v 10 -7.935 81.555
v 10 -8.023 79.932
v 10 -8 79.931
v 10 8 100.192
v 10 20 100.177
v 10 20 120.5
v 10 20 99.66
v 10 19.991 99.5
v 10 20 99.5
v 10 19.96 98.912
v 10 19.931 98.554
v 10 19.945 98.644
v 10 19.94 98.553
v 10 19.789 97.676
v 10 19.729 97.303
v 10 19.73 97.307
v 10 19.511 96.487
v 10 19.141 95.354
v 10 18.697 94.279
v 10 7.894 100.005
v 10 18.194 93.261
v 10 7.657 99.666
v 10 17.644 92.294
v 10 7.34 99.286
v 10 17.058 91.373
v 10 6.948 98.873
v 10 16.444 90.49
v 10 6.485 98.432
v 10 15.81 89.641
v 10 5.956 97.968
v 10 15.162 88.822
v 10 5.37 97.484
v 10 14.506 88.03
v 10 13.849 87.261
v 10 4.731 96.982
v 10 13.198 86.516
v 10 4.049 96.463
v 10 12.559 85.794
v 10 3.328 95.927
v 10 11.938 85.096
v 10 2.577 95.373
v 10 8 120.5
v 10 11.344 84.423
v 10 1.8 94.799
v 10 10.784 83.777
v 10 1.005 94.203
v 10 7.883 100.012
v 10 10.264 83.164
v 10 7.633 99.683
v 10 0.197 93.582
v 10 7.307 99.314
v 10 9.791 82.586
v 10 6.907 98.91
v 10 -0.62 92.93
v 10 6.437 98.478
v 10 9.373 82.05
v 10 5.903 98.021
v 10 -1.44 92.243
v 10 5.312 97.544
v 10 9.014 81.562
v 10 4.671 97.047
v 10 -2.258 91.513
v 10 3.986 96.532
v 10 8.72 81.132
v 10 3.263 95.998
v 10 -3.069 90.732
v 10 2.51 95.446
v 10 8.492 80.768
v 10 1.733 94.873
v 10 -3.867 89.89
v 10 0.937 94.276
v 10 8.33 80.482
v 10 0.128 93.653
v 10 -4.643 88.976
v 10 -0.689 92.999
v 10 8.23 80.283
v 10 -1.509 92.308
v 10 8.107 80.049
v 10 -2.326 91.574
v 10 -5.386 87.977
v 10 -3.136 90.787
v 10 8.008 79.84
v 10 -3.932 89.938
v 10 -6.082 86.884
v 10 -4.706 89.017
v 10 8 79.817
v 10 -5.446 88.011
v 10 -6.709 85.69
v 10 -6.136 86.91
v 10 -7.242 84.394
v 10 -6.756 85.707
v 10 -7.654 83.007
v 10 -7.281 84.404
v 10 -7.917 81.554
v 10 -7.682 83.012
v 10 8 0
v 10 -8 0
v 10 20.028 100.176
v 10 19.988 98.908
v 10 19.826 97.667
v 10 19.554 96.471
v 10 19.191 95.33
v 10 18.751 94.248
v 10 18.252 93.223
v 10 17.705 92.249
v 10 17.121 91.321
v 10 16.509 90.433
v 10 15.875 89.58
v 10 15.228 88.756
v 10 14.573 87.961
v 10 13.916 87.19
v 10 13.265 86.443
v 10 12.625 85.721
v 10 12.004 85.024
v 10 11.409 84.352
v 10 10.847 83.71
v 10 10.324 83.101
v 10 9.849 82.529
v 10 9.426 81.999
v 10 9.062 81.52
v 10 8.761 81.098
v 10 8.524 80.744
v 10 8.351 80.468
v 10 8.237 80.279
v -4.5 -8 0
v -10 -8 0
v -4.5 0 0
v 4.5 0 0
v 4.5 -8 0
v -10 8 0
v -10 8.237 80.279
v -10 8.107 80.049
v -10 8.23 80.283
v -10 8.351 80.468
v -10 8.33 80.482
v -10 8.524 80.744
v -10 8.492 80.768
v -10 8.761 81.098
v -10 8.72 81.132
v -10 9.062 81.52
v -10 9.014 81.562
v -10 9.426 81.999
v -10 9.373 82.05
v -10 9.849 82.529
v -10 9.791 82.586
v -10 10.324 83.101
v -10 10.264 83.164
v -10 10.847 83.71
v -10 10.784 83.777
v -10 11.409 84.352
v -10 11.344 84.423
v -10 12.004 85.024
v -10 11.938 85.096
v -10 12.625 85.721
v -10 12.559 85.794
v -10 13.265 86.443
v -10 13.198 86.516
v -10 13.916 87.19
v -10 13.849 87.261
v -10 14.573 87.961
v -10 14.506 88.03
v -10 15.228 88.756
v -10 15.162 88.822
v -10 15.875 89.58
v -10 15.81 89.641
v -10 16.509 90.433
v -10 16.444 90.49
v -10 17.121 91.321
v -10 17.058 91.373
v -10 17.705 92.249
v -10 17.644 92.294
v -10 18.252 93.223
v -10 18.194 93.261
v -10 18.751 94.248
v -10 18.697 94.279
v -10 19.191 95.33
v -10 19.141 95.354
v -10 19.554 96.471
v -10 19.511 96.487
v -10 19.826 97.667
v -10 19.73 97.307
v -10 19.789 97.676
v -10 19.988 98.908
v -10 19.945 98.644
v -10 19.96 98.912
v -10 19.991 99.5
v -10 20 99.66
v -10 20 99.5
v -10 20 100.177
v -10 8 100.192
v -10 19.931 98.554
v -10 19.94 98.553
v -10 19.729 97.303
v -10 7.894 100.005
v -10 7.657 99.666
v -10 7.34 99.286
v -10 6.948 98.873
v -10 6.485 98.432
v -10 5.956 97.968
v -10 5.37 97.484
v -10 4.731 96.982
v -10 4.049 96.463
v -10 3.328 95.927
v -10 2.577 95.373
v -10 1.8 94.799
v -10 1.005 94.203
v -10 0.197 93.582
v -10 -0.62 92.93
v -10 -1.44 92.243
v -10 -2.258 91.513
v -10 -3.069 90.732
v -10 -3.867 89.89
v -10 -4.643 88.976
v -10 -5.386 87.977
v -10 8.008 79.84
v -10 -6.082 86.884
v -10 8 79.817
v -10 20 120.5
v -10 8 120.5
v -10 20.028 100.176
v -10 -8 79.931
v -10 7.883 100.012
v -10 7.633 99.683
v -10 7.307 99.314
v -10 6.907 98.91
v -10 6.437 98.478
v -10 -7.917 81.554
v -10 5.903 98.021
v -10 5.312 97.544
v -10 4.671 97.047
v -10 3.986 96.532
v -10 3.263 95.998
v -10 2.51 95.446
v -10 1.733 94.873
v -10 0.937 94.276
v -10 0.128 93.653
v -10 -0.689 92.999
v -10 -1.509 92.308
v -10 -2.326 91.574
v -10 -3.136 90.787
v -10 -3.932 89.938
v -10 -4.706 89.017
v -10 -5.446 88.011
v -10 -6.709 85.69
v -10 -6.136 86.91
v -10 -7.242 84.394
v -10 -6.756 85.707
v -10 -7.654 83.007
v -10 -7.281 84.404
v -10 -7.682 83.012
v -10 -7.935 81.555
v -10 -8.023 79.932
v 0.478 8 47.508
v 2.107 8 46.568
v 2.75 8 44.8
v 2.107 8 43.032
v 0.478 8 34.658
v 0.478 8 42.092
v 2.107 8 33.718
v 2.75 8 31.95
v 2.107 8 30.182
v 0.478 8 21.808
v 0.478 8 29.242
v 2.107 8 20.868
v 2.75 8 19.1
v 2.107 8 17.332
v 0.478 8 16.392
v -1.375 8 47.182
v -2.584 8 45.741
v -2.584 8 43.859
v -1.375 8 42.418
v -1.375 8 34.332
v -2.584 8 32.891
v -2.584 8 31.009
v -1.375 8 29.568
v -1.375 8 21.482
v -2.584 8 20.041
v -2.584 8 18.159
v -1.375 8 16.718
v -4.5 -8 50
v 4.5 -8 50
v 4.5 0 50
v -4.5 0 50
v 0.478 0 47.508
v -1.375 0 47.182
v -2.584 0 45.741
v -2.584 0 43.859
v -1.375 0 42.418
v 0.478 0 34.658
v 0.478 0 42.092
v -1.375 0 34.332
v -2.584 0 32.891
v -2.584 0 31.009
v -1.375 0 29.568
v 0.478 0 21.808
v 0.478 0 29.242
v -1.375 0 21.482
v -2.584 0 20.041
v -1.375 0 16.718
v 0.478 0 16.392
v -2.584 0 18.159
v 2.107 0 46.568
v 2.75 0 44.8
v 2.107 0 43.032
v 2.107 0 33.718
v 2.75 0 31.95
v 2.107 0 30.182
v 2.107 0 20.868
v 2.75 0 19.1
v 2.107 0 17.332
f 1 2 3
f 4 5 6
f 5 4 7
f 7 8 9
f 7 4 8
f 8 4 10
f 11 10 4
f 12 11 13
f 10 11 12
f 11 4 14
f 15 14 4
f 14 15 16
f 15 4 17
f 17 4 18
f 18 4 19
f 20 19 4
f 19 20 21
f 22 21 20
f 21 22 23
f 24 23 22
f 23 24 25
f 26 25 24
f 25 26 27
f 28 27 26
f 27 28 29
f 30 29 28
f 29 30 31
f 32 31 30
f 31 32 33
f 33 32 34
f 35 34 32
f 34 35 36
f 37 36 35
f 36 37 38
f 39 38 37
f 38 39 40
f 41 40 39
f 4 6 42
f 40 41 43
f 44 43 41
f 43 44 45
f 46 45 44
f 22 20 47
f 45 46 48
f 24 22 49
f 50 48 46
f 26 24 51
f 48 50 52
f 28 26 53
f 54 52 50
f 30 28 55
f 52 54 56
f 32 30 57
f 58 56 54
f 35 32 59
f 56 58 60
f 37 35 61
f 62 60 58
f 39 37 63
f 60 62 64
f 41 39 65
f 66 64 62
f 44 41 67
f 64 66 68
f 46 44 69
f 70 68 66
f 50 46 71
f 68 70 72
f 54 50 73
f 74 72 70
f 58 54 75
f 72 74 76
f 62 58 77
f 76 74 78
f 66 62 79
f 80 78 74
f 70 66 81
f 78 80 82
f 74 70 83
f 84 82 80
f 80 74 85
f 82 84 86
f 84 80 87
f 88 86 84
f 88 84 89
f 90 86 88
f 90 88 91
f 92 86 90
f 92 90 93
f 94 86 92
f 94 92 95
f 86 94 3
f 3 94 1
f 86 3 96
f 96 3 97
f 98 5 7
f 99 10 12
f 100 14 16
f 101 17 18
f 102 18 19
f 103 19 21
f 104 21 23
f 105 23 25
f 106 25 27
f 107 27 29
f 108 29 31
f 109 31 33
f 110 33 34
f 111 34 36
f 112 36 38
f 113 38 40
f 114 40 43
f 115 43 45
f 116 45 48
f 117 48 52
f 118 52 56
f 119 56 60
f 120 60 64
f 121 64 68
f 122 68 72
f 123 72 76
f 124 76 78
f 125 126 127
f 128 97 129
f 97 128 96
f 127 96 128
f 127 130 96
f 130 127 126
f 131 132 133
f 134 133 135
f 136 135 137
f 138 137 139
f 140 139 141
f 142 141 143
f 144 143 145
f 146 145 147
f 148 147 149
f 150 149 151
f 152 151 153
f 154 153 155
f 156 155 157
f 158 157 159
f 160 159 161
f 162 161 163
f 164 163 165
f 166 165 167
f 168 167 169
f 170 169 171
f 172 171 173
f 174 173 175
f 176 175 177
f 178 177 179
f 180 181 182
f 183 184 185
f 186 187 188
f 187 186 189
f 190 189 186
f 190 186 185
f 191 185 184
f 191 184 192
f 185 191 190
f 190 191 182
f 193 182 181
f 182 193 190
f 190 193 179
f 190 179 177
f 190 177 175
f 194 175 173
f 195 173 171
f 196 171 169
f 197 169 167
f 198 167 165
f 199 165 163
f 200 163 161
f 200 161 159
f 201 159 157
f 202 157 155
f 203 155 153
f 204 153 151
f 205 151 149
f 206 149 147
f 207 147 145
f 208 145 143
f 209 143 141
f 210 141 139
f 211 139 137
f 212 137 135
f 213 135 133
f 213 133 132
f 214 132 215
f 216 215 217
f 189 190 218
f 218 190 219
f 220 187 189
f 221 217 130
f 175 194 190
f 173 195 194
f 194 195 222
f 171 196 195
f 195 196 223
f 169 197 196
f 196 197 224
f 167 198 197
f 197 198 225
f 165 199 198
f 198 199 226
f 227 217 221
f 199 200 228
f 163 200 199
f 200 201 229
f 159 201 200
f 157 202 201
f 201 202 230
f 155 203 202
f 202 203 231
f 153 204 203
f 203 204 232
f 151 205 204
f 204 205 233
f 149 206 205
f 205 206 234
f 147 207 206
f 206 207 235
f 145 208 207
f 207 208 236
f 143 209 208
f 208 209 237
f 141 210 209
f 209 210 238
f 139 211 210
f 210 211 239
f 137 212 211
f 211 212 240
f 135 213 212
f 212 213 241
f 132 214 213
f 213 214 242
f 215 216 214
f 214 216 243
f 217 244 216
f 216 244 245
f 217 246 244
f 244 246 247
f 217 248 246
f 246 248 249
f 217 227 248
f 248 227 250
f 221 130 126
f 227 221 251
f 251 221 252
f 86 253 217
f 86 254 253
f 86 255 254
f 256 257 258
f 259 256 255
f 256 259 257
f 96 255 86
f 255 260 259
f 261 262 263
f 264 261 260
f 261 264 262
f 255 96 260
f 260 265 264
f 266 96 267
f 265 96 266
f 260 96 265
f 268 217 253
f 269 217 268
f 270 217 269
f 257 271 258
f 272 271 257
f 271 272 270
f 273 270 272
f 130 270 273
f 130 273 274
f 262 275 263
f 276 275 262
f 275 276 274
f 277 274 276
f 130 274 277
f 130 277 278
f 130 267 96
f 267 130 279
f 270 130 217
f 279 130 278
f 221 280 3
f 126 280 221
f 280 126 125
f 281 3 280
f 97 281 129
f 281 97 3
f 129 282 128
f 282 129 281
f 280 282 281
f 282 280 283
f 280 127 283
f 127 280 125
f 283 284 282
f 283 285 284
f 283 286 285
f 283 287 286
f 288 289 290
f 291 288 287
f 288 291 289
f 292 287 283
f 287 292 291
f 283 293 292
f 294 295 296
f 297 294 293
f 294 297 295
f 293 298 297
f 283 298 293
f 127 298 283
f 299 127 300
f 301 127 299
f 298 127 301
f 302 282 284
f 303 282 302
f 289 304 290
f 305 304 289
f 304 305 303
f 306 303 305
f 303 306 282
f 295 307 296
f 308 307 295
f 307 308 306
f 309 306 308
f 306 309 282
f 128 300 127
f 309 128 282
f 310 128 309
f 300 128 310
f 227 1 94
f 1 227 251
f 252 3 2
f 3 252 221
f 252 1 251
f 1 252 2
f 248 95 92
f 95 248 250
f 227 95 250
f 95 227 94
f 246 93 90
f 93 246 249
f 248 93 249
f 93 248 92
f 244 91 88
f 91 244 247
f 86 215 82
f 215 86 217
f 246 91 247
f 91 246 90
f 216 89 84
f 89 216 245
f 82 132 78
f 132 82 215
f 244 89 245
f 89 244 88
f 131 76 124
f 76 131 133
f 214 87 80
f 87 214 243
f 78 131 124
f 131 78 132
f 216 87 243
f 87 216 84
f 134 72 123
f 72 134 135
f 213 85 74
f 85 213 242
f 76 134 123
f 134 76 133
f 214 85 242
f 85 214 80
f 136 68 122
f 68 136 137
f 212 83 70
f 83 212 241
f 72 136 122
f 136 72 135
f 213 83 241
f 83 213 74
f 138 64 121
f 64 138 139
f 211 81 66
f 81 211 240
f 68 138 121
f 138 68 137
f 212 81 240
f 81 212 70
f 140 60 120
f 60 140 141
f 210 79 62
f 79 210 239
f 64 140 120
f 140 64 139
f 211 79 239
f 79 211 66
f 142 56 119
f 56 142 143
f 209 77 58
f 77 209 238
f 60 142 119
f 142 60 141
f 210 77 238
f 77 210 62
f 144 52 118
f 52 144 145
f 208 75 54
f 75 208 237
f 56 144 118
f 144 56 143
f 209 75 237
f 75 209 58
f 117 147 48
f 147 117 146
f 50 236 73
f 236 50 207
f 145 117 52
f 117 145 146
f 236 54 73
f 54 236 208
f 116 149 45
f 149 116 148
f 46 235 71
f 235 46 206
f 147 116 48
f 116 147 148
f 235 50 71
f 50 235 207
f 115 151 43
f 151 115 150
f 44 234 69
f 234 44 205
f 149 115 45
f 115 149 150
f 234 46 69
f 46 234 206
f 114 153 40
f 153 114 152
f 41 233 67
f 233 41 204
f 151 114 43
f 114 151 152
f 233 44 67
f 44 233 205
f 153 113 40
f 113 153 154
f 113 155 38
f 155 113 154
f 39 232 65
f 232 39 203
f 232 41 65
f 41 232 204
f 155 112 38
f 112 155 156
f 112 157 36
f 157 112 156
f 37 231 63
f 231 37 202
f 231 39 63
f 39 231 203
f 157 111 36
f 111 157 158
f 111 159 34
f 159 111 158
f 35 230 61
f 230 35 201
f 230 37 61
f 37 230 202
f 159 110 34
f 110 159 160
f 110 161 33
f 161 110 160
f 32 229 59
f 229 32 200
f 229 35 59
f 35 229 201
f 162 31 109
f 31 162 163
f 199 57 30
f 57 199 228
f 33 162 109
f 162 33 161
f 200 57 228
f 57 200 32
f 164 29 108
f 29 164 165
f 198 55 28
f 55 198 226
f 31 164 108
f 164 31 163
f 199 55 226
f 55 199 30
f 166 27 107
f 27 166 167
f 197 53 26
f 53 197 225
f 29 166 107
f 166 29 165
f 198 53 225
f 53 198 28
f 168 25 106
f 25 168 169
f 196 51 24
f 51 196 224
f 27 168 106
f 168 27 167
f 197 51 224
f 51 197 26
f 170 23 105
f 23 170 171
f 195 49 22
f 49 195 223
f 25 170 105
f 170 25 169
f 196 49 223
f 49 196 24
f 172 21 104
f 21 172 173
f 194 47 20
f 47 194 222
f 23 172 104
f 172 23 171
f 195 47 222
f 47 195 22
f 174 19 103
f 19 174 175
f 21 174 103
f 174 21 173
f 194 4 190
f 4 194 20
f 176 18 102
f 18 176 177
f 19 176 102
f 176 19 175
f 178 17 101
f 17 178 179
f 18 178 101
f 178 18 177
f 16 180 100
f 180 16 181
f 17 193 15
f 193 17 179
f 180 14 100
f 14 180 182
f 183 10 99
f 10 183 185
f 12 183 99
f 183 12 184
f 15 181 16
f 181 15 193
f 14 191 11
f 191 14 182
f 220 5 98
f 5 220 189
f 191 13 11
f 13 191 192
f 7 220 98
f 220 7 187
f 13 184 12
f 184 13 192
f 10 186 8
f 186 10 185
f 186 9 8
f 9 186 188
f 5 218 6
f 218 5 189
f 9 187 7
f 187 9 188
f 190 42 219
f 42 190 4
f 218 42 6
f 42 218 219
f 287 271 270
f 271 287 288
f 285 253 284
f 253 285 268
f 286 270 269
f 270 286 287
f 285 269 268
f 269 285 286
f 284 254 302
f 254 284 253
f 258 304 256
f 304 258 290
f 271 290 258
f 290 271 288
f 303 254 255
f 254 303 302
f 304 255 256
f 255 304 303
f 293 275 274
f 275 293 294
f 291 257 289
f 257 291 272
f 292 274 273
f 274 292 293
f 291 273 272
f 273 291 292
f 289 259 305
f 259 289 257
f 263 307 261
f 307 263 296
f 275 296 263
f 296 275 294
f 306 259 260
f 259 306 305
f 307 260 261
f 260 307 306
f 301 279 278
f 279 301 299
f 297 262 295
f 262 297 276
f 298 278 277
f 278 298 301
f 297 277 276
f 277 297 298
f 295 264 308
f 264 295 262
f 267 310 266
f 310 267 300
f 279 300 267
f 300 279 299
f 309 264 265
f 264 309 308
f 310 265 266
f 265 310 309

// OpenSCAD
// 车前固定接口 (Z轴稳定器 / 大行P8猪鼻转换底座抱箍)
// 坐标系: X=底座宽方向(正视图水平), Y=厚度方向(正视图纵深, M5孔沿此方向贯穿),
//          Z=竖直向上(底座高度方向)。整体在 X、Y 向居中。
// 底座: 20(宽) x 16(厚) x 80(高), 中央开竖槽(槽顶 z=BASE_H-SLOT_FROM_TOP), 底面开口竖直上插,
//       把抱箍螺丝座板(≈8宽 x 8厚)包入槽内增加稳定性。
// 延长臂: 截面独立(ARM_W x ARM_T), 从底座顶向"猪鼻环一侧"(+Y)平滑 S 形弯上, 末端竖直向上。
// M5孔距有二义性(12.5/25 或 13.2/26.4), 孔1 做成竖向短槽留旷量, 孔2/孔3 为竖向长槽。

// ========== 可调参数 ==========
BASE_W   = 20;      // 底座宽 (X), 正视图水平
BASE_T   = 16;      // 底座厚 (Y)
BASE_H   = 80;      // 底座高 (Z)

SLOT_W   = 9;       // 竖槽宽 (X)  —— 抱箍板宽 8, 留 1 旷量防 PETG 收缩
SLOT_D   = 8;       // 竖槽深 (Y)  —— 前侧挖去 8, 留 8 厚背壁
SLOT_FROM_TOP = 30; // 槽顶距底座顶距离
SLOT_TOP = BASE_H - SLOT_FROM_TOP;           // 槽顶 z(=50), 高于此处实体, 底面开口

HOLE_D   = 5.5;     // M5 间隙孔直径
HOLE1_TOP_GAP = 2.45; // 孔1 上弧边距槽顶的实测距离 (有测量误差)
HOLE1_EXT = 0.6;    // 孔1 竖槽两端额外余量(mm), 覆盖 2.45 的测量误差
HOLE_GAP13 = 25;    // 孔1 - 孔3 名义间距(mm)
HOLE_GAP12 = 13.2;  // 孔1 - 孔2 名义间距(mm)
HOLE_ALT13 = 26.4;  // 孔1 - 孔3 备选间距(若三孔等分)
HOLE_ALT12 = 12.5;  // 孔1 - 孔2 备选间距(若三孔等分)
SLOT_EXT   = 0.6;   // 孔槽两端额外余量(mm)

// 延长臂
ARM_W      = 20;     // 臂宽 (X) —— 独立设置
ARM_T      = 12;     // 臂厚 (Y) —— 独立设置
ARM_OFFSET = 14;    // 臂向猪鼻侧(+Y)的水平偏移
ARM_BEND   = 20;    // 弯段高度(mm): 底座顶 → 竖直段起点 的平滑过渡
ARM_VERT   = 20;    // 臂端竖直直臂长度(mm)
ARM_DIR    = +1;    // +1 = 向 +Y(远离螺丝座=猪鼻环侧); -1 = 反向
FC         = 64;    // 扫描细分段数(越大越平滑)

// 臂顶 z(总高)= 底座高 + 弯段高 + 竖直段长
ARM_TOP    = BASE_H + ARM_BEND + ARM_VERT;
RH = HOLE_D/2;      // M5 间隙孔半径

// ========== 底座(居中于 x=0, y=0; 0..BASE_H) ==========
// 竖槽: z∈[0, SLOT_TOP] 底面开口; X 居中宽 SLOT_W; 前侧(-Y)挖 SLOT_D, 留背部 SLOT_D 厚壁。
module base() {
    difference() {
        translate([0, 0, BASE_H/2]) cube([BASE_W, BASE_T, BASE_H], center=true);
        // 槽体: 从底面(z=0)开口向上到 SLOT_TOP; 贴前侧 -Y 面挖 SLOT_D
        translate([0, -(BASE_T/2) + SLOT_D/2, SLOT_TOP/2])
            cube([SLOT_W, SLOT_D, SLOT_TOP], center=true);
    }
}

// ========== 底座上的 3 颗 M5 孔 ==========
// 按槽顶(SLOT_TOP)定位: 孔1 上弧边距槽顶 = HOLE1_TOP_GAP。
module vh_slot(zc, len) {
    // 沿 Z 的竖向长槽, 贯穿 Y; 槽宽=X 方向 HOLE_D, 槽总高 = len + HOLE_D
    translate([0,0,zc])
    rotate([90,0,0])
    hull() {
        translate([0,0,  len/2]) cylinder(r=RH, h=BASE_T+2, center=true);
        translate([0,0, -len/2]) cylinder(r=RH, h=BASE_T+2, center=true);
    }
}

module holes() {
    z1 = SLOT_TOP - HOLE1_TOP_GAP - RH;   // 孔1 中心 z(=槽顶 - 2.45 - 2.75 ≈ 44.8)
    // 孔1: 竖向短槽(留旷量)
    vh_slot(z1, 2*HOLE1_EXT);
    // 孔2
    z2n = z1 - HOLE_GAP12;
    z2a = z1 - HOLE_ALT12;
    vh_slot((z2n+z2a)/2, abs(z2n-z2a) + 2*SLOT_EXT);
    // 孔3
    z3n = z1 - HOLE_GAP13;
    z3a = z1 - HOLE_ALT13;
    vh_slot((z3n+z3a)/2, abs(z3n-z3a) + 2*SLOT_EXT);
}

// ========== 延长臂: S 形弯段 + 顶端竖直直臂段 ==========
// 中心线 y(t)=ARM_OFFSET*(1-cos(180t))/2 (度制), z(t)=BASE_H+(ARM_TOP-BASE_H)*t。
// 截面从底座截面(BASE_W x BASE_T)平滑过渡到臂截面(ARM_W x ARM_T), 余弦缓动。
// 注意: 本 OpenSCAD 的 cos/sin/atan2 以"度"为单位(cos(90)=0)。
function _cy(z, zc0, zb0, off0) = (z <= zb0)
    ? off0 * (1 - cos(180 * (z - zc0)/(zb0 - zc0))) / 2
    : off0;
function _ease(u) = (u >= 1) ? 1 : (u <= 0 ? 0 : (1 - cos(180*u))/2);

module arm() {
    N  = FC;
    ZB = BASE_H + ARM_BEND;            // 弯段顶 = 竖直段起点
    for(i=[0:N-1]) {
        z0 = BASE_H + (ARM_TOP - BASE_H) * i/N;
        z1 = BASE_H + (ARM_TOP - BASE_H) * (i+1)/N;
        zc = (z0 + z1)/2;
        yy = ARM_DIR * _cy(zc, BASE_H, ZB, ARM_OFFSET);
        dyf = _cy(z1, BASE_H, ZB, ARM_OFFSET) - _cy(z0, BASE_H, ZB, ARM_OFFSET);
        dzf = z1 - z0;
        th  = atan2(dyf, dzf);         // 切线相对 +Z 的倾角(度)
        // 截面随弯段平滑过渡: BASE -> ARM
        u  = (zc - BASE_H) / max(ARM_BEND, 1e-9);
        e  = _ease(u);
        w  = BASE_W + (ARM_W - BASE_W)*e;
        th2= BASE_T + (ARM_T - BASE_T)*e;
        L  = 2.6*(ARM_TOP - BASE_H)/N; // 每段长度(稍重叠保证连续)
        translate([0, yy, zc])
            rotate([-th, 0, 0])        // 绕 X 旋转, 使本段沿切线方向
            cube([w, th2, L], center=true);
    }
}

// ========== 合成 ==========
difference() {
    union() {
        base();
        arm();
    }
    holes();
}
